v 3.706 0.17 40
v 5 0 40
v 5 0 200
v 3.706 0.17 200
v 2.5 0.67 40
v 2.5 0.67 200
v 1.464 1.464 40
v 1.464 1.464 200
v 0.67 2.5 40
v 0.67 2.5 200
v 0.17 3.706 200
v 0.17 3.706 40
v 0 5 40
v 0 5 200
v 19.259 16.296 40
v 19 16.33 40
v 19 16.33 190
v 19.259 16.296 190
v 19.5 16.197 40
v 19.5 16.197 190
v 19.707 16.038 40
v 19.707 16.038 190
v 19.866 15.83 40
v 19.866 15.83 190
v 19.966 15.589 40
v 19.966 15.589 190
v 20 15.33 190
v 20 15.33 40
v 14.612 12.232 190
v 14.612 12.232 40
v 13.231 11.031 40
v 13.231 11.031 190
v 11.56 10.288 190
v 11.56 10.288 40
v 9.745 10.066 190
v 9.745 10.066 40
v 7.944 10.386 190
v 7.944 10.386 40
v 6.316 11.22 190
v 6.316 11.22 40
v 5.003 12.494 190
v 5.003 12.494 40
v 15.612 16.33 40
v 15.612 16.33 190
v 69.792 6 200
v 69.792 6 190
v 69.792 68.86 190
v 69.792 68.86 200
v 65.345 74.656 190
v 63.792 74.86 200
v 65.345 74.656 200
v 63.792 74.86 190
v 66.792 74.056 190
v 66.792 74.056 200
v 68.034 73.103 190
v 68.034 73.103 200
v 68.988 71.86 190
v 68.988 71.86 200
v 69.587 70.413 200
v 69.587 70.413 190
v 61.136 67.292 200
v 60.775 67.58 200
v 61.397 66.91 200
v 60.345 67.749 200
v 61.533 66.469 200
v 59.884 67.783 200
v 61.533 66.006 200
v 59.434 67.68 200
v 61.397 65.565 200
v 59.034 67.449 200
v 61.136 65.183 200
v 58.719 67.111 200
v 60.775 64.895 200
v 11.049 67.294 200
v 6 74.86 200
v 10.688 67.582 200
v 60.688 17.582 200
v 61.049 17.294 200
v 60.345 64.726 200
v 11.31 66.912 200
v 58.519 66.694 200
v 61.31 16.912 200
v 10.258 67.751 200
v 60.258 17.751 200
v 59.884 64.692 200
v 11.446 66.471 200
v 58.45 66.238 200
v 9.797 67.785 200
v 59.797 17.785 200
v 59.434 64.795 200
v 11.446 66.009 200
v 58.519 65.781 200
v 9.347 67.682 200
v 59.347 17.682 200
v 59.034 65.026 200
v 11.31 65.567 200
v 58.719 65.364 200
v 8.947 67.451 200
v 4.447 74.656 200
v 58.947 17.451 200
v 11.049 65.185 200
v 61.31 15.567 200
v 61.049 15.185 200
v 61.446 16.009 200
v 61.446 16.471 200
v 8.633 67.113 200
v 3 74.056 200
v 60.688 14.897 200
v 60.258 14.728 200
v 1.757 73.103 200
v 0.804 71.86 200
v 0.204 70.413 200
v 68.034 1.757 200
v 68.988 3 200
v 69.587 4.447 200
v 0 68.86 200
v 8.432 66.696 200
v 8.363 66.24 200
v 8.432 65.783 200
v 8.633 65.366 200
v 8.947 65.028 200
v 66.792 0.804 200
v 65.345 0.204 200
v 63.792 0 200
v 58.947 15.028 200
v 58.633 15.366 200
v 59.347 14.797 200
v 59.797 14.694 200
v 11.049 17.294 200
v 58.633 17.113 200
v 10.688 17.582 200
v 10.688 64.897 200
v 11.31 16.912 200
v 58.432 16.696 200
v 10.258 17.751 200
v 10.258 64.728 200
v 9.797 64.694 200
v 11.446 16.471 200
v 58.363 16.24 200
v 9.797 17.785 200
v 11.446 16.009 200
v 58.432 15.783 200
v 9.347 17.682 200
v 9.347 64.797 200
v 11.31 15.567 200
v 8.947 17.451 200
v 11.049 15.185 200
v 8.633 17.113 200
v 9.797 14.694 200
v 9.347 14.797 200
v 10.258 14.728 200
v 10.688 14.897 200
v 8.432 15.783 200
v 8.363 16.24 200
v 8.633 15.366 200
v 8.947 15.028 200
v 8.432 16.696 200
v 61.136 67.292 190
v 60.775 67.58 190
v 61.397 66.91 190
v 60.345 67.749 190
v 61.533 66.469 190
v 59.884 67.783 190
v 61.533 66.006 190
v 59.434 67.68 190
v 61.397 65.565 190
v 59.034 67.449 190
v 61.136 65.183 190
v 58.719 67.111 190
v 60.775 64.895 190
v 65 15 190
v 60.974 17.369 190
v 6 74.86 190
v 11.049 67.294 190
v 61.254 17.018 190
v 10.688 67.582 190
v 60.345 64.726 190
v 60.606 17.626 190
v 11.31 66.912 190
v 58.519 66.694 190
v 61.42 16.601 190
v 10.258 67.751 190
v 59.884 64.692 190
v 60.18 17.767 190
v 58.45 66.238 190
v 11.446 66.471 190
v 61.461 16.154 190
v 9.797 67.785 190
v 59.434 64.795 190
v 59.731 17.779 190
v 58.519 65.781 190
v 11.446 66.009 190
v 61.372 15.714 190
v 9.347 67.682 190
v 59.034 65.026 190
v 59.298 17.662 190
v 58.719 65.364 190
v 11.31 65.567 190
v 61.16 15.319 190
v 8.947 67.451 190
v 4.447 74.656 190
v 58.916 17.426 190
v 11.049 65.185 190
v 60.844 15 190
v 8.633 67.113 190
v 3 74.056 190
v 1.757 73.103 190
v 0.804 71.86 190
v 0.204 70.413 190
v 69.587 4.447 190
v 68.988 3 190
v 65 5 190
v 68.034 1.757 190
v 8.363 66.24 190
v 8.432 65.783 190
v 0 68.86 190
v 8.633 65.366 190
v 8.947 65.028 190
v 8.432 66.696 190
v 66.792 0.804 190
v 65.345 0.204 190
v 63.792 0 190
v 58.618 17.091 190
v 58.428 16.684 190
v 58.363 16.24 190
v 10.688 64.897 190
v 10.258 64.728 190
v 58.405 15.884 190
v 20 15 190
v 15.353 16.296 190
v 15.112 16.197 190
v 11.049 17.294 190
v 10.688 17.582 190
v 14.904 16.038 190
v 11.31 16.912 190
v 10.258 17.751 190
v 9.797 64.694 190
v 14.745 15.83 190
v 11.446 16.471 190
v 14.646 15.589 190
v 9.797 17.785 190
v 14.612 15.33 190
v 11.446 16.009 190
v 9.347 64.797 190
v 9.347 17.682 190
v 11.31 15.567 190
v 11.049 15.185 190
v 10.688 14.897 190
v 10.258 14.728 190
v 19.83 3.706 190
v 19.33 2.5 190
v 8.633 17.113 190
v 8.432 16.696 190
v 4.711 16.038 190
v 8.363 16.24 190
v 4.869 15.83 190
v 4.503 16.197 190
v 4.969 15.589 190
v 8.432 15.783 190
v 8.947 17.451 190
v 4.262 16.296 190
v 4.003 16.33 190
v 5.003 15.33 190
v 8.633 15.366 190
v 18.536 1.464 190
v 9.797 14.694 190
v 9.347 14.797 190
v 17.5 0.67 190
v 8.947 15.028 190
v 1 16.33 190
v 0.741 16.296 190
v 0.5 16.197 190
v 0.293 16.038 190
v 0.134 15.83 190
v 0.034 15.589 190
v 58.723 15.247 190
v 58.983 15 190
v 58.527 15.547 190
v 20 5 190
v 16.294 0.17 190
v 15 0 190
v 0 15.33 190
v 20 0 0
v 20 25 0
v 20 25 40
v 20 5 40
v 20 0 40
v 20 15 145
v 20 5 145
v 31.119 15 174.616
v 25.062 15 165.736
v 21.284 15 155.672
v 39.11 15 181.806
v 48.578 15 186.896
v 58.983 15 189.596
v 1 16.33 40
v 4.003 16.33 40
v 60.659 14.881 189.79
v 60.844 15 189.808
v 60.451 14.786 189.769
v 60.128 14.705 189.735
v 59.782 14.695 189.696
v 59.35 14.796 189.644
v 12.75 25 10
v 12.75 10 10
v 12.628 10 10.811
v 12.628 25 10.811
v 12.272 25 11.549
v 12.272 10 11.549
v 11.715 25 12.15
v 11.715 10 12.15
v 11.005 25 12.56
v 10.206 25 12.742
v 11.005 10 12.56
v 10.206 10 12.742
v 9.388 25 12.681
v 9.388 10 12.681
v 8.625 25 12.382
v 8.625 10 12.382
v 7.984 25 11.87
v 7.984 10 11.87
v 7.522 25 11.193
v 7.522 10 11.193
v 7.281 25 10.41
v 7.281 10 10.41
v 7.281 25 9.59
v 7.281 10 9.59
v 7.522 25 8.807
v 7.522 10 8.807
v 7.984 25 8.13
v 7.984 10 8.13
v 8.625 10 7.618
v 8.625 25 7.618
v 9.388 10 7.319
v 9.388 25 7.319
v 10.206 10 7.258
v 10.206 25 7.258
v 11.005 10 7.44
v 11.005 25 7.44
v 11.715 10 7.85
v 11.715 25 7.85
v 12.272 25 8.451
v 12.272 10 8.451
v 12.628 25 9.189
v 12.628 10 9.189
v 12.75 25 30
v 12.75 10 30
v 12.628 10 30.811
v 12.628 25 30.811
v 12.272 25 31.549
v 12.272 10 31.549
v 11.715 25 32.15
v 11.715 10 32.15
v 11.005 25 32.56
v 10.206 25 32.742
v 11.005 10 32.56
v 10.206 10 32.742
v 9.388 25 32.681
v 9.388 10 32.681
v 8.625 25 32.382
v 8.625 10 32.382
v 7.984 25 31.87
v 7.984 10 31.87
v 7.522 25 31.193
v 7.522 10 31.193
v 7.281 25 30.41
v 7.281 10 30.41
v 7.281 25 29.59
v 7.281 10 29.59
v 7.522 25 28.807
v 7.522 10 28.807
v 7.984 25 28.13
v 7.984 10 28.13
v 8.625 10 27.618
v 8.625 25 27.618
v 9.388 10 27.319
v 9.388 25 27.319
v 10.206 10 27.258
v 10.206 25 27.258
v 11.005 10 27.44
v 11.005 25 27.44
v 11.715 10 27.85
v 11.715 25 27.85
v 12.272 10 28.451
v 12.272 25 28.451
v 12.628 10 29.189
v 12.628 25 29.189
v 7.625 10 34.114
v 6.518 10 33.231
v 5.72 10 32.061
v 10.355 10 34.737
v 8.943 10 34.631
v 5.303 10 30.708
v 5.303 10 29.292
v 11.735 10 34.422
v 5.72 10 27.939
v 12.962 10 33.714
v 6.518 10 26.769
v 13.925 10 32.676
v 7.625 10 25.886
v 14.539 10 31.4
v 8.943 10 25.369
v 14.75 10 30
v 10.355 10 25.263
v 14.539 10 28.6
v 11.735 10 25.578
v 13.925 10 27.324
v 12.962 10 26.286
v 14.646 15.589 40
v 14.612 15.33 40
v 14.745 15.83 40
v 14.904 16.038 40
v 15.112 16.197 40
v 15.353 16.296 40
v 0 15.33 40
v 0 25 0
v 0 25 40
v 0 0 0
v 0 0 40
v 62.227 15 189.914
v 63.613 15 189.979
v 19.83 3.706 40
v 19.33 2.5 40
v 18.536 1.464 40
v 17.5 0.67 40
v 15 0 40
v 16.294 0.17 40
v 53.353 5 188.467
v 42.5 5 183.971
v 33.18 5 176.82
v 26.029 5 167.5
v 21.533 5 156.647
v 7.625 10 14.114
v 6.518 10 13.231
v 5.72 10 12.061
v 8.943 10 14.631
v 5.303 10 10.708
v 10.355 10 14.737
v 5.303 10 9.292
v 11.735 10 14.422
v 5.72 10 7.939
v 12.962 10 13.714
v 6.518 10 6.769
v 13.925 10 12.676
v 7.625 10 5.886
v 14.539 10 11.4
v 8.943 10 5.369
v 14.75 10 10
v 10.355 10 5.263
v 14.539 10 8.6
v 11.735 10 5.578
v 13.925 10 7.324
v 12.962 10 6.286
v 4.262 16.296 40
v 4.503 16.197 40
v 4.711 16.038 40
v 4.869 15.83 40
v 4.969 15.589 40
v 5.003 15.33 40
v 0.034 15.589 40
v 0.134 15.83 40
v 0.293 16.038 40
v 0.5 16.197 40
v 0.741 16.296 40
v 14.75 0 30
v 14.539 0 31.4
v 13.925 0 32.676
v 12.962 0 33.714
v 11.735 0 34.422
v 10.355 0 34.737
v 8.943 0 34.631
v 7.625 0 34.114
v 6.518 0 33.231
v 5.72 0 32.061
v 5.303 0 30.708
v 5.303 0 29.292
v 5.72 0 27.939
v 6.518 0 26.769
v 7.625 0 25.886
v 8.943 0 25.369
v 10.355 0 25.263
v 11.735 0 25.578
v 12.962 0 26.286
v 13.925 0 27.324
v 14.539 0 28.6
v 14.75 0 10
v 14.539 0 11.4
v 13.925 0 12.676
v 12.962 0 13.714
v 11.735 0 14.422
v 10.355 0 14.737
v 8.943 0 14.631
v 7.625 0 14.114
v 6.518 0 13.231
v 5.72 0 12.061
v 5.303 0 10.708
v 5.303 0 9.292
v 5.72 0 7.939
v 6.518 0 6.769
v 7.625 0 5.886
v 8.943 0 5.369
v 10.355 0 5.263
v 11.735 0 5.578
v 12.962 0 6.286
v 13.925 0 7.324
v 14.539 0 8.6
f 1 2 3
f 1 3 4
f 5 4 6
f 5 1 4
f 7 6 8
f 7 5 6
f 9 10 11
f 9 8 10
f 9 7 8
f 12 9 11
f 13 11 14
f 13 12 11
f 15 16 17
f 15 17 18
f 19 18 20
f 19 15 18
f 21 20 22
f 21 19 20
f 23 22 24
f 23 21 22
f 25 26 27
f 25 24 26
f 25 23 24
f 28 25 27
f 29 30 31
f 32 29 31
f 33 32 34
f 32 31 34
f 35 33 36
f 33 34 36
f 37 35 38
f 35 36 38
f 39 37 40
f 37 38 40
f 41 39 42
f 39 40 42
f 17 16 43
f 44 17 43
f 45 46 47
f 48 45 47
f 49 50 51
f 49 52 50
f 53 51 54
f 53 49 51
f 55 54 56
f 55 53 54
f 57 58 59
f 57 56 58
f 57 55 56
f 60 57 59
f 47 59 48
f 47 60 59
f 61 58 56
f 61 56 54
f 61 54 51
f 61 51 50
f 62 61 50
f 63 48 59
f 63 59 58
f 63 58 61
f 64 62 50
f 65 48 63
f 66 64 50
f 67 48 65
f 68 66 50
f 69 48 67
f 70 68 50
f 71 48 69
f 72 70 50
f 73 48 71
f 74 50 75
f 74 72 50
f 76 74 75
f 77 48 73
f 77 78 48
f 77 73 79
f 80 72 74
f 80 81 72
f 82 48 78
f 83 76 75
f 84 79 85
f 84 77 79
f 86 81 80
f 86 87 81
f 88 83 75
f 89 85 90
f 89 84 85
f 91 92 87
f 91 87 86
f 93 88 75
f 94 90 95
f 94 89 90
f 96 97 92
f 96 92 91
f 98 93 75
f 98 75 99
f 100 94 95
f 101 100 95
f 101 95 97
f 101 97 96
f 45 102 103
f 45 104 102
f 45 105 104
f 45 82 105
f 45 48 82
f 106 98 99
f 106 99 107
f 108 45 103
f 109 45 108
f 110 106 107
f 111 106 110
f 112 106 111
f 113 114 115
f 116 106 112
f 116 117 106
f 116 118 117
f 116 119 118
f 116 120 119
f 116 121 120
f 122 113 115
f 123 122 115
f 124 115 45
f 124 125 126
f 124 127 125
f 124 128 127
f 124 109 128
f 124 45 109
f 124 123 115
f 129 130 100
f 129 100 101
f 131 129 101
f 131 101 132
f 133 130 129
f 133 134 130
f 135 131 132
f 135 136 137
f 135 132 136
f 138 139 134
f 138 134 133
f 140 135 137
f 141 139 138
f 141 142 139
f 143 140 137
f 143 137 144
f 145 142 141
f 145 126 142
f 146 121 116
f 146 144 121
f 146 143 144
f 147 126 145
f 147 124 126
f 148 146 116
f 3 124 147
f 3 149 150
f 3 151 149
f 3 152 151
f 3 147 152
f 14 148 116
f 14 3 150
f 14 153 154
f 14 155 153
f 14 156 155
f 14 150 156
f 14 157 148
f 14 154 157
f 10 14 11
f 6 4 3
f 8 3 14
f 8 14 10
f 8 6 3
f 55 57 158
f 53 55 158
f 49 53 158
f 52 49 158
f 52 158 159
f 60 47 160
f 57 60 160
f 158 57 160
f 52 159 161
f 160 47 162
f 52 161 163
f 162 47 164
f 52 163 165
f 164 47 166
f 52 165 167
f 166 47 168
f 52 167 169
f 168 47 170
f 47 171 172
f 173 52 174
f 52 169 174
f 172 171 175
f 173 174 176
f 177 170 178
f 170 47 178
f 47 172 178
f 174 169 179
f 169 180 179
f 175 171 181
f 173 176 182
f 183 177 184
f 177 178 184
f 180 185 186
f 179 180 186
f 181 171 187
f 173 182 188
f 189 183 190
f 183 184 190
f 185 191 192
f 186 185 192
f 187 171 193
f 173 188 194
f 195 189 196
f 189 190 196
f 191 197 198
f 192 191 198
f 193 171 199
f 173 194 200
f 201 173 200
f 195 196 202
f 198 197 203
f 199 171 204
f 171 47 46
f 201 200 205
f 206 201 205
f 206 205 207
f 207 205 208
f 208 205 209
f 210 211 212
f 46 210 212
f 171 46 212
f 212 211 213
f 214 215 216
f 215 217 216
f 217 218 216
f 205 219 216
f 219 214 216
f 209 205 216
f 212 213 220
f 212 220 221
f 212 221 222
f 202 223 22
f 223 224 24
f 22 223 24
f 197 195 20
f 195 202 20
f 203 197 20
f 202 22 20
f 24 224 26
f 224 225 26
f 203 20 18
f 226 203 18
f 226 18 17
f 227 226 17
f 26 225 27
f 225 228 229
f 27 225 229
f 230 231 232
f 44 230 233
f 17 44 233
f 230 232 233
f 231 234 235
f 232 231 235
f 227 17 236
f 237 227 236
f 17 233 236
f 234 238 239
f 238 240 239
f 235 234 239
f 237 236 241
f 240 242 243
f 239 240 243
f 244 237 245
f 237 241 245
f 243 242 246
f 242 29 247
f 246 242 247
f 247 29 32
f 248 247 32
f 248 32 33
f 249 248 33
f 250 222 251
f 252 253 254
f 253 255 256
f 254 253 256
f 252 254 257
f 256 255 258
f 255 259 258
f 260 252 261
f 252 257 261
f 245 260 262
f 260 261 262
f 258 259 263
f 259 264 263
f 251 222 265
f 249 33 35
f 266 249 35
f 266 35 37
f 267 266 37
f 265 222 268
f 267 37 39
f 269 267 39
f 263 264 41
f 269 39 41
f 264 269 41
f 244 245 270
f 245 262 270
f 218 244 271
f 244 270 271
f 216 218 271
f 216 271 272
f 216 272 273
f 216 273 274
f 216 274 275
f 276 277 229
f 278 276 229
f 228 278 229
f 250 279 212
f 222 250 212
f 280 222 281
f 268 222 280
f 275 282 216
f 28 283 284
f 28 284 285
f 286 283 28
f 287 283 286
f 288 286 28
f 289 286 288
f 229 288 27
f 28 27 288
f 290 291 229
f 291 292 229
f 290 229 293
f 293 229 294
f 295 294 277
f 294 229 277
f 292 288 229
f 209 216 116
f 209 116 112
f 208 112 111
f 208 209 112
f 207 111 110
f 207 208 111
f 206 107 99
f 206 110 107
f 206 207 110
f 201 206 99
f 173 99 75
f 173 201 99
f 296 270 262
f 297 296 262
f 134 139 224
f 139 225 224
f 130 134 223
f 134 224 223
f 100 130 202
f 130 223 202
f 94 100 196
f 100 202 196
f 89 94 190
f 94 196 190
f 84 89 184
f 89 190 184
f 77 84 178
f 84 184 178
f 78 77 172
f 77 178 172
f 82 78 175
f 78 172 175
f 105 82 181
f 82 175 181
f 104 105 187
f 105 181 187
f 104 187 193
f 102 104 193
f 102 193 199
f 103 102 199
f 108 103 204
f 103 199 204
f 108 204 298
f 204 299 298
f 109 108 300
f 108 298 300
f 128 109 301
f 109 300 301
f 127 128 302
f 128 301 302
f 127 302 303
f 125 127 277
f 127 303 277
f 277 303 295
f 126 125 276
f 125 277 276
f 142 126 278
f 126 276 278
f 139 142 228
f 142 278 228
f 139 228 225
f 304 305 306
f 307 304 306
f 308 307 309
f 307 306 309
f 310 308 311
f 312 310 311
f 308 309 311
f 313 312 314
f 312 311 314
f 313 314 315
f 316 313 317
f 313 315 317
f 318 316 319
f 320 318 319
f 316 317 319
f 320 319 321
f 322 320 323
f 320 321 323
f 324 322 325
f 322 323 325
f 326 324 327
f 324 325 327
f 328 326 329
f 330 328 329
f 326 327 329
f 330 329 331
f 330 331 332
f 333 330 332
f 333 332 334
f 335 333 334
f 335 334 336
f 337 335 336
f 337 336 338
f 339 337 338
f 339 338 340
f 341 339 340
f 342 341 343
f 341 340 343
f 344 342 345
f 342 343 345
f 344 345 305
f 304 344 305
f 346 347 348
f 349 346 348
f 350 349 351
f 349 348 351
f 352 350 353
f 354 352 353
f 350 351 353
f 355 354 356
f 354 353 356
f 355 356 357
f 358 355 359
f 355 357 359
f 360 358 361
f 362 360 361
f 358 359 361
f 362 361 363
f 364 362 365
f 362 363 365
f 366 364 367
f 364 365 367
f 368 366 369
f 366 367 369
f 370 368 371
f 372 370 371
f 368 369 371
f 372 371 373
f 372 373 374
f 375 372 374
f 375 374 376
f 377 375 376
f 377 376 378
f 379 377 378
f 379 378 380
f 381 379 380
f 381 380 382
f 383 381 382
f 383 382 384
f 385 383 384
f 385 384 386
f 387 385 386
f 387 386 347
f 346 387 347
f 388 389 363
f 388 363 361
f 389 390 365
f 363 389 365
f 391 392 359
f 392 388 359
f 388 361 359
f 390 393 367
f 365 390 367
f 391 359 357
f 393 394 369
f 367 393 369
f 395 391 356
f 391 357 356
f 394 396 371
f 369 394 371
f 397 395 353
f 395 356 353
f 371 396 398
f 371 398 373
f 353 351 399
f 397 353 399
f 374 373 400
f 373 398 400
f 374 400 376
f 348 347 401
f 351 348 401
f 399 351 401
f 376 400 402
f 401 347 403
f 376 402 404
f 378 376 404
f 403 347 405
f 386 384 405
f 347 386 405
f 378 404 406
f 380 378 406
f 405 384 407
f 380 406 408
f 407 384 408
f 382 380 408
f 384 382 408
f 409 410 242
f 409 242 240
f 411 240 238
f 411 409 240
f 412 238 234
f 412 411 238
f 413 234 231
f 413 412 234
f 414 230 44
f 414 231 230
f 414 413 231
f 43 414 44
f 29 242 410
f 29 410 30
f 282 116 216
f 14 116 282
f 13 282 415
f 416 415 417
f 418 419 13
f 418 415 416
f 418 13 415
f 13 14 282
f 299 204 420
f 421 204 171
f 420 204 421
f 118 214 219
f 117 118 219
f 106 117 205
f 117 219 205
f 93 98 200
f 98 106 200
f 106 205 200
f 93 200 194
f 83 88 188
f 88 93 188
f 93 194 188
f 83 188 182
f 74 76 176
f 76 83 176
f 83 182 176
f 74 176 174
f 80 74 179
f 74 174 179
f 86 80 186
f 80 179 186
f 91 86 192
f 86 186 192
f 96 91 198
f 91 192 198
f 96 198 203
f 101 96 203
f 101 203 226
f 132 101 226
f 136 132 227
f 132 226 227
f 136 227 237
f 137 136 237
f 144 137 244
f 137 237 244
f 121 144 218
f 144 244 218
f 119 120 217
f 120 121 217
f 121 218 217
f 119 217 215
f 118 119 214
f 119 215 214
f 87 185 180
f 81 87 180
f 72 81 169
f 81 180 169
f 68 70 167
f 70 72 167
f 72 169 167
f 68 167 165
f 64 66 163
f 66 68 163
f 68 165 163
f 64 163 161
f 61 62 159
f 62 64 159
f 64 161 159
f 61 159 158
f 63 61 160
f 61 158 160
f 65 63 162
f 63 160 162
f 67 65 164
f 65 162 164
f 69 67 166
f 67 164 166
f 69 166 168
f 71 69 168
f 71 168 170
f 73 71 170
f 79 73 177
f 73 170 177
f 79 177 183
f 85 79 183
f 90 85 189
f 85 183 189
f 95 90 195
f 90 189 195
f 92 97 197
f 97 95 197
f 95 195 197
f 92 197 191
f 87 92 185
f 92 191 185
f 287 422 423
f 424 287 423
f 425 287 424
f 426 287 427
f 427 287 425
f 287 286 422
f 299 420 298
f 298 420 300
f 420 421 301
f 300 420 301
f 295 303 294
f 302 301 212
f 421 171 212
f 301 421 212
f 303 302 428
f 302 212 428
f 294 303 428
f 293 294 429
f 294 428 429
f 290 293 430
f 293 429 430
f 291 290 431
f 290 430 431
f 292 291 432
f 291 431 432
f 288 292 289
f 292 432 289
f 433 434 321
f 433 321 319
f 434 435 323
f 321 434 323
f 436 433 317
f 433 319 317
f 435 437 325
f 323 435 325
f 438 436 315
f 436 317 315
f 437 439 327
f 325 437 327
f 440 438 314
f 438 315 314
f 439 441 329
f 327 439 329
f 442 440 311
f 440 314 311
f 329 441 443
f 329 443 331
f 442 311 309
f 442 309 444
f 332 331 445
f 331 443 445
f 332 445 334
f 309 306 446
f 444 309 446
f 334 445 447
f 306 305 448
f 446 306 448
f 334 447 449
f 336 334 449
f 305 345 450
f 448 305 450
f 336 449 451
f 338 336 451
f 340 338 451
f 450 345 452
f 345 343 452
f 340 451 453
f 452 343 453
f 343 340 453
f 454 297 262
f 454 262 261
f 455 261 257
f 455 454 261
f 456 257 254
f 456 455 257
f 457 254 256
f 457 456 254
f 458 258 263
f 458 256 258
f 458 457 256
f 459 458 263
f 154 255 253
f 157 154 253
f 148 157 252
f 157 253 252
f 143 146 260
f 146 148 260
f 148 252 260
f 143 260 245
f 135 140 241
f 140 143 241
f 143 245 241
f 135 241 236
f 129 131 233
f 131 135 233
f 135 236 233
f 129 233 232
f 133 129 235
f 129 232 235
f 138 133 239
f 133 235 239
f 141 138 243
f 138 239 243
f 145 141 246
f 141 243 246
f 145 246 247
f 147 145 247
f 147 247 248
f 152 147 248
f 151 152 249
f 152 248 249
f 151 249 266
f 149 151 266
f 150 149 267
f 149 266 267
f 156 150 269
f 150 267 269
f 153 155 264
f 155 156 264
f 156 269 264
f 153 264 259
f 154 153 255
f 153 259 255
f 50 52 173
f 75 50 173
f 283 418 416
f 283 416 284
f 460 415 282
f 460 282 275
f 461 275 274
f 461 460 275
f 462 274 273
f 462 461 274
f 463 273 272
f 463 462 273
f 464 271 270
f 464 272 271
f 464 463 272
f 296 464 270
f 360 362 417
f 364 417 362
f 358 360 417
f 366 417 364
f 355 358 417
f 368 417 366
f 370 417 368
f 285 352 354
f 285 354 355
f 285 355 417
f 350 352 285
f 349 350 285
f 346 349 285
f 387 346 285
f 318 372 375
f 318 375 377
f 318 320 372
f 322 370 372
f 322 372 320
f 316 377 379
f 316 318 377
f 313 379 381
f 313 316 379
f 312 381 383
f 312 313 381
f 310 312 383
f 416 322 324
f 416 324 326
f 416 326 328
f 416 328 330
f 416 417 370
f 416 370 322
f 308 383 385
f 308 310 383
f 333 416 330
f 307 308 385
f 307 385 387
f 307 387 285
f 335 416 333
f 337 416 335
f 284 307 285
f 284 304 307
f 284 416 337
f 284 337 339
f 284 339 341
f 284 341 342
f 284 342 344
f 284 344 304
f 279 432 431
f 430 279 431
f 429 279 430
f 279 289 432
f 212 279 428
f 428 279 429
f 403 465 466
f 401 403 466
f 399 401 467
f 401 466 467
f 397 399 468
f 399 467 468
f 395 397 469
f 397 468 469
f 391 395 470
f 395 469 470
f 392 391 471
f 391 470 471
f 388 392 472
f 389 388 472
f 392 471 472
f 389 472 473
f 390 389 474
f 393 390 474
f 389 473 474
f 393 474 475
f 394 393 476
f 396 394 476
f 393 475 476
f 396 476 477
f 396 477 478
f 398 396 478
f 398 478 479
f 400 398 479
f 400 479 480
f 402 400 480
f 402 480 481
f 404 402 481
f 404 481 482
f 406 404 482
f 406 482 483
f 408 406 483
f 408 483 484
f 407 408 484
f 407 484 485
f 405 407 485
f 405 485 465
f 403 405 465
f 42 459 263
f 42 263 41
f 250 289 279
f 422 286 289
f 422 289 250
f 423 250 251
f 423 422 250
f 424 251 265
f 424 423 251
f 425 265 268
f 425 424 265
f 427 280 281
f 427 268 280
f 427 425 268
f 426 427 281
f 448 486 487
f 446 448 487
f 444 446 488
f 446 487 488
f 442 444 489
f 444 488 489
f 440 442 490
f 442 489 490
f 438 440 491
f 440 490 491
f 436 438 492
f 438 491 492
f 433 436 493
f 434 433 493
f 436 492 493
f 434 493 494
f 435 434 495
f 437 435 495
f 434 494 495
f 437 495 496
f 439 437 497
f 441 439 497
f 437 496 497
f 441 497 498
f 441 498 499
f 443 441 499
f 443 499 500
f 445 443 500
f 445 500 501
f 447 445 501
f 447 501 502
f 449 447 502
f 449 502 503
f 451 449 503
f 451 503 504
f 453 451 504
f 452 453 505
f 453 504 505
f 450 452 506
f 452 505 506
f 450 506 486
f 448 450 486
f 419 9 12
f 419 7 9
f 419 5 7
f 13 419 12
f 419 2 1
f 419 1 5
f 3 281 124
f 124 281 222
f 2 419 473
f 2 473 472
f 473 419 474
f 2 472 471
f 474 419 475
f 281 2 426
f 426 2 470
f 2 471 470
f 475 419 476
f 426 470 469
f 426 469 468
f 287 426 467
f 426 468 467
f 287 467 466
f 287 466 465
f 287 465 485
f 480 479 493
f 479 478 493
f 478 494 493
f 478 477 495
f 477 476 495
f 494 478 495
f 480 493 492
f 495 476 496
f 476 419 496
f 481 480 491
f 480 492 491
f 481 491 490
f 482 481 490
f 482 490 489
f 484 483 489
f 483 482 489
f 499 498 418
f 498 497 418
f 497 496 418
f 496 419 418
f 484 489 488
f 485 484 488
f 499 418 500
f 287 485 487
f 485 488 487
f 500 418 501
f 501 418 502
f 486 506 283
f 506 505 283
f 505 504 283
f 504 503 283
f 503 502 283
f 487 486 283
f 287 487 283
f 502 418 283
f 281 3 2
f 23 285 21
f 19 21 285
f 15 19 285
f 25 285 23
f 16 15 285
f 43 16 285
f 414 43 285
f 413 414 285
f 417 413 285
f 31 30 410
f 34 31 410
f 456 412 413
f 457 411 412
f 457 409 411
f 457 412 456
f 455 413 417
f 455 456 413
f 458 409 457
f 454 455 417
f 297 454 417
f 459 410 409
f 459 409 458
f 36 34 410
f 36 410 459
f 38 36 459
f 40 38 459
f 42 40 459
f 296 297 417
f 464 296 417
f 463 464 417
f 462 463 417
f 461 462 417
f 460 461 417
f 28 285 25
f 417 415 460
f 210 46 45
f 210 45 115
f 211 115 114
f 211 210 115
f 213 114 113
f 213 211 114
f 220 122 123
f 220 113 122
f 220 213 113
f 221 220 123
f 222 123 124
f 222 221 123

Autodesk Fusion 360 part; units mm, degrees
sketch "Sketch1" plane through (0, 0, 0) normal (0, 1, 0) x (1, 0, 0)
  line L0 (0, 0) -> (20, 0)
  line L1 (20, 0) -> (20, -40)
  line L2 (20, -40) -> (0, -40)
  line L3 (0, -40) -> (0, 0)
  line L4 (20, -40) -> (10, -40)
  line L5 (10, -40) -> (10, 0)
  line L6 (10, -40) -> (10, -30)
  line L7 (10, 0) -> (10, -10)
  circle A0 centre (10, -10) radius 2.75
  circle A1 centre (10, -30) radius 2.75
  circle A2 centre (10, -30) radius 4.75
  circle A3 centre (10, -10) radius 4.75
  dimension "d1" = 20
  dimension "d2" = 40
  dimension "d3" = 10
  dimension "d4" = 10
  dimension "d5" = 10
  dimension "d6" = 5.5
  dimension "d7" = 5.5
  dimension "d10" = 9.5
  dimension "d11" = 9.5
extrude "Extrude1" add sketch "Sketch1" along normal blind 25 contours L0 L2 L3 L5 L6 L7 A2 A3 | L0 L1 L2 L4 L5 L6 L7 A2 A3 | L5 L7 A0 A3 | L5 L7 A0 A3 | L5 L6 A1 A2 | L5 L6 A1 A2
extrude "Extrude2" cut sketch "Sketch1" along normal blind 10 contours L5 L7 A0 A3 | L5 L7 A0 A3 | L5 L6 A1 A2 | L5 L6 A1 A2
sketch "Sketch2" plane through (0, 0, 0) normal (1, 0, 0) x (0, 1, 0)
  line L0 (0, 0) -> (20, 0)
  line L1 (20, 0) -> (20, 40)
  line L2 (20, 40) -> (0, 40)
  line L3 (0, 40) -> (0, 0)
  line L4 (0, 30) -> (10, 30)
  line L5 (0, 10) -> (10, 10)
  circle A0 centre (10, 30) radius 2.35
  circle A1 centre (10, 10) radius 2.35
  dimension "d14" = 20
  dimension "d15" = 10
  dimension "d16" = 10
  dimension "d17" = 4.7
  dimension "d18" = 4.7
sketch "Sketch3" plane through (0, 0, 40) normal (0, 0, 1) x (-1, 0, 0)
  line L0 (0, 0) -> (-20, 0)
  line L1 (-20, 0) -> (-20, -25)
  line L2 (-20, -25) -> (0, -25)
  line L3 (0, -25) -> (0, 0)
  line L4 (-15, 0) -> (-5, 0)
  line L5 (0, -5) -> (0, -15.3305)
  line L6 (-20, -15.3305) -> (-20, -5)
  line L7 (-10.403, -10.0836) -> (-9.4234, -10.0836)
  line L8 (0, -10) -> (0, -15.3305)
  line L9 (-19, -16.3305) -> (-15.6115, -16.3305)
  line L10 (-14.6115, -15.3305) -> (-14.6115, -12.2318)
  line L11 (-1, -16.3305) -> (-4.0034, -16.3305)
  line L12 (-5.0034, -15.3305) -> (-5.0034, -12.4938)
  arc A0 (-5.0034, -12.4938) -> (-14.6115, -12.2318) centre (-9.9132, -16.2396) ccw
  line L13 (-1, -16.3305) -> (-4.0034, -16.3305)
  line L14 (-15.6115, -16.3305) -> (-19, -16.3305)
  line L15 (-1, -16.3305) -> (-4.0034, -16.3305)
  line L16 (-15.6115, -16.3305) -> (-19, -16.3305)
  arc A1 (-15.6115, -16.3305) -> (-14.6115, -15.3305) centre (-15.6115, -15.3305) ccw
  arc A2 (-5.0034, -15.3305) -> (-4.0034, -16.3305) centre (-4.0034, -15.3305) ccw
  arc A3 (-20, -15.3305) -> (-19, -16.3305) centre (-19, -15.3305) ccw
  arc A4 (-1, -16.3305) -> (0, -15.3305) centre (-1, -15.3305) ccw
  arc A5 (-15, 0) -> (-20, -5) centre (-15, -5) ccw
  arc A6 (0, -5) -> (-5, 0) centre (-5, -5) ccw
  dimension "d24" = 1
  dimension "d25" = 1
  dimension "d26" = 5
extrude "Extrude4" add sketch "Sketch3" along normal blind 150 contours L0 L1 L3 L4 L5 L6 L8 L9 L10 L11 L12 A0 L13 L14 L15 L16 A1 A2 A3 A4 A5 A6
sketch "Sketch4" plane through (0, 0, 190) normal (0, 0, 1) x (-1, 0, 0)
  line L0 (0, -15.3305) -> (0, -5)
  arc A0 (0, -5) -> (-5, 0) centre (-5, -5) ccw
  line L1 (-5, 0) -> (-15, 0)
  arc A1 (-15, 0) -> (-20, -5) centre (-15, -5) ccw
  line L2 (-20, -5) -> (-20, -15.3305)
  arc A2 (-20, -15.3305) -> (-19, -16.3305) centre (-19, -15.3305) ccw
  line L3 (-19, -16.3305) -> (-15.6115, -16.3305)
  arc A3 (-15.6115, -16.3305) -> (-14.6115, -15.3305) centre (-15.6115, -15.3305) ccw
  line L4 (-14.6115, -15.3305) -> (-14.6115, -12.2318)
  arc A4 (-5.0034, -12.4938) -> (-14.6115, -12.2318) centre (-9.9132, -16.2396) ccw
  line L5 (-5.0034, -12.4938) -> (-5.0034, -15.3305)
  arc A5 (-5.0034, -15.3305) -> (-4.0034, -16.3305) centre (-4.0034, -15.3305) ccw
  line L6 (-4.0034, -16.3305) -> (-1, -16.3305)
  arc A6 (-1, -16.3305) -> (0, -15.3305) centre (-1, -15.3305) ccw
  circle A7 centre (-9.9132, -16.2396) radius 1.55
  line L7 (0, 0) -> (-63.7918, 0)
  line L8 (-69.7918, -6) -> (-69.7918, -68.86)
  line L9 (-63.7918, -74.86) -> (-6, -74.86)
  line L10 (0, -68.86) -> (0, 0)
  arc A8 (-63.7918, 0) -> (-69.7918, -6) centre (-63.7918, -6) ccw
  arc A9 (-69.7918, -68.86) -> (-63.7918, -74.86) centre (-63.7918, -68.86) ccw
  arc A10 (-6, -74.86) -> (0, -68.86) centre (-6, -68.86) ccw
  arc A11 (0, -5) -> (-5, 0) centre (-5, -5) ccw
  circle A12 centre (-59.9132, -16.2396) radius 1.55
  circle A13 centre (-60, -66.2375) radius 1.55
  circle A14 centre (-9.9132, -66.2396) radius 1.55
  dimension "d29" = 3.1
  dimension "d30" = 50
  dimension "d31" = 50
  dimension "d32" = 6
  dimension "d33" = 3.1
  dimension "d34" = 3.1
  dimension "d35" = 3.1
extrude "Extrude5" add sketch "Sketch4" along normal blind 10 contours L0 A0 L1 A1 L2 A2 L3 A3 L4 A4 L5 A5 L6 A6 L7 L10 A11 | A1 L2 A2 L3 A3 L4 A4 L5 A5 L6 A6 L7 L8 L9 L10 A8 A9 A10
sketch "Sketch5" plane through (0, 0, 0) normal (0, -1, 0) x (1, 0, 0)
  circle A0 centre (10, 30) radius 4.75
  circle A1 centre (10, 10) radius 4.75
  line L0 (20, 0) -> (20, 40)
  line L1 (20, 40) -> (15, 40)
  line L2 (15, 40) -> (15, 190)
  line L3 (15, 190) -> (63.7918, 190)
  line L4 (63.7918, 190) -> (63.7918, 200)
  line L5 (63.7918, 200) -> (5, 200)
  line L6 (5, 200) -> (5, 40)
  line L7 (5, 40) -> (0, 40)
  line L8 (0, 40) -> (0, 0)
  line L9 (0, 0) -> (20, 0)
  line L10 (20, 190) -> (65, 190)
  line L11 (20, 145) -> (20, 190)
  arc A2 (65, 190) -> (20, 145) centre (65, 145) ccw
extrude "Extrude6" add sketch "Sketch5" against normal blind 10 from surface at -5 contours L3 L10 L11 A2
extrude "Extrude7" cut 1 faces at (59.9434, 14.7871, 190) along direction (0, 0, -1) blind 5
